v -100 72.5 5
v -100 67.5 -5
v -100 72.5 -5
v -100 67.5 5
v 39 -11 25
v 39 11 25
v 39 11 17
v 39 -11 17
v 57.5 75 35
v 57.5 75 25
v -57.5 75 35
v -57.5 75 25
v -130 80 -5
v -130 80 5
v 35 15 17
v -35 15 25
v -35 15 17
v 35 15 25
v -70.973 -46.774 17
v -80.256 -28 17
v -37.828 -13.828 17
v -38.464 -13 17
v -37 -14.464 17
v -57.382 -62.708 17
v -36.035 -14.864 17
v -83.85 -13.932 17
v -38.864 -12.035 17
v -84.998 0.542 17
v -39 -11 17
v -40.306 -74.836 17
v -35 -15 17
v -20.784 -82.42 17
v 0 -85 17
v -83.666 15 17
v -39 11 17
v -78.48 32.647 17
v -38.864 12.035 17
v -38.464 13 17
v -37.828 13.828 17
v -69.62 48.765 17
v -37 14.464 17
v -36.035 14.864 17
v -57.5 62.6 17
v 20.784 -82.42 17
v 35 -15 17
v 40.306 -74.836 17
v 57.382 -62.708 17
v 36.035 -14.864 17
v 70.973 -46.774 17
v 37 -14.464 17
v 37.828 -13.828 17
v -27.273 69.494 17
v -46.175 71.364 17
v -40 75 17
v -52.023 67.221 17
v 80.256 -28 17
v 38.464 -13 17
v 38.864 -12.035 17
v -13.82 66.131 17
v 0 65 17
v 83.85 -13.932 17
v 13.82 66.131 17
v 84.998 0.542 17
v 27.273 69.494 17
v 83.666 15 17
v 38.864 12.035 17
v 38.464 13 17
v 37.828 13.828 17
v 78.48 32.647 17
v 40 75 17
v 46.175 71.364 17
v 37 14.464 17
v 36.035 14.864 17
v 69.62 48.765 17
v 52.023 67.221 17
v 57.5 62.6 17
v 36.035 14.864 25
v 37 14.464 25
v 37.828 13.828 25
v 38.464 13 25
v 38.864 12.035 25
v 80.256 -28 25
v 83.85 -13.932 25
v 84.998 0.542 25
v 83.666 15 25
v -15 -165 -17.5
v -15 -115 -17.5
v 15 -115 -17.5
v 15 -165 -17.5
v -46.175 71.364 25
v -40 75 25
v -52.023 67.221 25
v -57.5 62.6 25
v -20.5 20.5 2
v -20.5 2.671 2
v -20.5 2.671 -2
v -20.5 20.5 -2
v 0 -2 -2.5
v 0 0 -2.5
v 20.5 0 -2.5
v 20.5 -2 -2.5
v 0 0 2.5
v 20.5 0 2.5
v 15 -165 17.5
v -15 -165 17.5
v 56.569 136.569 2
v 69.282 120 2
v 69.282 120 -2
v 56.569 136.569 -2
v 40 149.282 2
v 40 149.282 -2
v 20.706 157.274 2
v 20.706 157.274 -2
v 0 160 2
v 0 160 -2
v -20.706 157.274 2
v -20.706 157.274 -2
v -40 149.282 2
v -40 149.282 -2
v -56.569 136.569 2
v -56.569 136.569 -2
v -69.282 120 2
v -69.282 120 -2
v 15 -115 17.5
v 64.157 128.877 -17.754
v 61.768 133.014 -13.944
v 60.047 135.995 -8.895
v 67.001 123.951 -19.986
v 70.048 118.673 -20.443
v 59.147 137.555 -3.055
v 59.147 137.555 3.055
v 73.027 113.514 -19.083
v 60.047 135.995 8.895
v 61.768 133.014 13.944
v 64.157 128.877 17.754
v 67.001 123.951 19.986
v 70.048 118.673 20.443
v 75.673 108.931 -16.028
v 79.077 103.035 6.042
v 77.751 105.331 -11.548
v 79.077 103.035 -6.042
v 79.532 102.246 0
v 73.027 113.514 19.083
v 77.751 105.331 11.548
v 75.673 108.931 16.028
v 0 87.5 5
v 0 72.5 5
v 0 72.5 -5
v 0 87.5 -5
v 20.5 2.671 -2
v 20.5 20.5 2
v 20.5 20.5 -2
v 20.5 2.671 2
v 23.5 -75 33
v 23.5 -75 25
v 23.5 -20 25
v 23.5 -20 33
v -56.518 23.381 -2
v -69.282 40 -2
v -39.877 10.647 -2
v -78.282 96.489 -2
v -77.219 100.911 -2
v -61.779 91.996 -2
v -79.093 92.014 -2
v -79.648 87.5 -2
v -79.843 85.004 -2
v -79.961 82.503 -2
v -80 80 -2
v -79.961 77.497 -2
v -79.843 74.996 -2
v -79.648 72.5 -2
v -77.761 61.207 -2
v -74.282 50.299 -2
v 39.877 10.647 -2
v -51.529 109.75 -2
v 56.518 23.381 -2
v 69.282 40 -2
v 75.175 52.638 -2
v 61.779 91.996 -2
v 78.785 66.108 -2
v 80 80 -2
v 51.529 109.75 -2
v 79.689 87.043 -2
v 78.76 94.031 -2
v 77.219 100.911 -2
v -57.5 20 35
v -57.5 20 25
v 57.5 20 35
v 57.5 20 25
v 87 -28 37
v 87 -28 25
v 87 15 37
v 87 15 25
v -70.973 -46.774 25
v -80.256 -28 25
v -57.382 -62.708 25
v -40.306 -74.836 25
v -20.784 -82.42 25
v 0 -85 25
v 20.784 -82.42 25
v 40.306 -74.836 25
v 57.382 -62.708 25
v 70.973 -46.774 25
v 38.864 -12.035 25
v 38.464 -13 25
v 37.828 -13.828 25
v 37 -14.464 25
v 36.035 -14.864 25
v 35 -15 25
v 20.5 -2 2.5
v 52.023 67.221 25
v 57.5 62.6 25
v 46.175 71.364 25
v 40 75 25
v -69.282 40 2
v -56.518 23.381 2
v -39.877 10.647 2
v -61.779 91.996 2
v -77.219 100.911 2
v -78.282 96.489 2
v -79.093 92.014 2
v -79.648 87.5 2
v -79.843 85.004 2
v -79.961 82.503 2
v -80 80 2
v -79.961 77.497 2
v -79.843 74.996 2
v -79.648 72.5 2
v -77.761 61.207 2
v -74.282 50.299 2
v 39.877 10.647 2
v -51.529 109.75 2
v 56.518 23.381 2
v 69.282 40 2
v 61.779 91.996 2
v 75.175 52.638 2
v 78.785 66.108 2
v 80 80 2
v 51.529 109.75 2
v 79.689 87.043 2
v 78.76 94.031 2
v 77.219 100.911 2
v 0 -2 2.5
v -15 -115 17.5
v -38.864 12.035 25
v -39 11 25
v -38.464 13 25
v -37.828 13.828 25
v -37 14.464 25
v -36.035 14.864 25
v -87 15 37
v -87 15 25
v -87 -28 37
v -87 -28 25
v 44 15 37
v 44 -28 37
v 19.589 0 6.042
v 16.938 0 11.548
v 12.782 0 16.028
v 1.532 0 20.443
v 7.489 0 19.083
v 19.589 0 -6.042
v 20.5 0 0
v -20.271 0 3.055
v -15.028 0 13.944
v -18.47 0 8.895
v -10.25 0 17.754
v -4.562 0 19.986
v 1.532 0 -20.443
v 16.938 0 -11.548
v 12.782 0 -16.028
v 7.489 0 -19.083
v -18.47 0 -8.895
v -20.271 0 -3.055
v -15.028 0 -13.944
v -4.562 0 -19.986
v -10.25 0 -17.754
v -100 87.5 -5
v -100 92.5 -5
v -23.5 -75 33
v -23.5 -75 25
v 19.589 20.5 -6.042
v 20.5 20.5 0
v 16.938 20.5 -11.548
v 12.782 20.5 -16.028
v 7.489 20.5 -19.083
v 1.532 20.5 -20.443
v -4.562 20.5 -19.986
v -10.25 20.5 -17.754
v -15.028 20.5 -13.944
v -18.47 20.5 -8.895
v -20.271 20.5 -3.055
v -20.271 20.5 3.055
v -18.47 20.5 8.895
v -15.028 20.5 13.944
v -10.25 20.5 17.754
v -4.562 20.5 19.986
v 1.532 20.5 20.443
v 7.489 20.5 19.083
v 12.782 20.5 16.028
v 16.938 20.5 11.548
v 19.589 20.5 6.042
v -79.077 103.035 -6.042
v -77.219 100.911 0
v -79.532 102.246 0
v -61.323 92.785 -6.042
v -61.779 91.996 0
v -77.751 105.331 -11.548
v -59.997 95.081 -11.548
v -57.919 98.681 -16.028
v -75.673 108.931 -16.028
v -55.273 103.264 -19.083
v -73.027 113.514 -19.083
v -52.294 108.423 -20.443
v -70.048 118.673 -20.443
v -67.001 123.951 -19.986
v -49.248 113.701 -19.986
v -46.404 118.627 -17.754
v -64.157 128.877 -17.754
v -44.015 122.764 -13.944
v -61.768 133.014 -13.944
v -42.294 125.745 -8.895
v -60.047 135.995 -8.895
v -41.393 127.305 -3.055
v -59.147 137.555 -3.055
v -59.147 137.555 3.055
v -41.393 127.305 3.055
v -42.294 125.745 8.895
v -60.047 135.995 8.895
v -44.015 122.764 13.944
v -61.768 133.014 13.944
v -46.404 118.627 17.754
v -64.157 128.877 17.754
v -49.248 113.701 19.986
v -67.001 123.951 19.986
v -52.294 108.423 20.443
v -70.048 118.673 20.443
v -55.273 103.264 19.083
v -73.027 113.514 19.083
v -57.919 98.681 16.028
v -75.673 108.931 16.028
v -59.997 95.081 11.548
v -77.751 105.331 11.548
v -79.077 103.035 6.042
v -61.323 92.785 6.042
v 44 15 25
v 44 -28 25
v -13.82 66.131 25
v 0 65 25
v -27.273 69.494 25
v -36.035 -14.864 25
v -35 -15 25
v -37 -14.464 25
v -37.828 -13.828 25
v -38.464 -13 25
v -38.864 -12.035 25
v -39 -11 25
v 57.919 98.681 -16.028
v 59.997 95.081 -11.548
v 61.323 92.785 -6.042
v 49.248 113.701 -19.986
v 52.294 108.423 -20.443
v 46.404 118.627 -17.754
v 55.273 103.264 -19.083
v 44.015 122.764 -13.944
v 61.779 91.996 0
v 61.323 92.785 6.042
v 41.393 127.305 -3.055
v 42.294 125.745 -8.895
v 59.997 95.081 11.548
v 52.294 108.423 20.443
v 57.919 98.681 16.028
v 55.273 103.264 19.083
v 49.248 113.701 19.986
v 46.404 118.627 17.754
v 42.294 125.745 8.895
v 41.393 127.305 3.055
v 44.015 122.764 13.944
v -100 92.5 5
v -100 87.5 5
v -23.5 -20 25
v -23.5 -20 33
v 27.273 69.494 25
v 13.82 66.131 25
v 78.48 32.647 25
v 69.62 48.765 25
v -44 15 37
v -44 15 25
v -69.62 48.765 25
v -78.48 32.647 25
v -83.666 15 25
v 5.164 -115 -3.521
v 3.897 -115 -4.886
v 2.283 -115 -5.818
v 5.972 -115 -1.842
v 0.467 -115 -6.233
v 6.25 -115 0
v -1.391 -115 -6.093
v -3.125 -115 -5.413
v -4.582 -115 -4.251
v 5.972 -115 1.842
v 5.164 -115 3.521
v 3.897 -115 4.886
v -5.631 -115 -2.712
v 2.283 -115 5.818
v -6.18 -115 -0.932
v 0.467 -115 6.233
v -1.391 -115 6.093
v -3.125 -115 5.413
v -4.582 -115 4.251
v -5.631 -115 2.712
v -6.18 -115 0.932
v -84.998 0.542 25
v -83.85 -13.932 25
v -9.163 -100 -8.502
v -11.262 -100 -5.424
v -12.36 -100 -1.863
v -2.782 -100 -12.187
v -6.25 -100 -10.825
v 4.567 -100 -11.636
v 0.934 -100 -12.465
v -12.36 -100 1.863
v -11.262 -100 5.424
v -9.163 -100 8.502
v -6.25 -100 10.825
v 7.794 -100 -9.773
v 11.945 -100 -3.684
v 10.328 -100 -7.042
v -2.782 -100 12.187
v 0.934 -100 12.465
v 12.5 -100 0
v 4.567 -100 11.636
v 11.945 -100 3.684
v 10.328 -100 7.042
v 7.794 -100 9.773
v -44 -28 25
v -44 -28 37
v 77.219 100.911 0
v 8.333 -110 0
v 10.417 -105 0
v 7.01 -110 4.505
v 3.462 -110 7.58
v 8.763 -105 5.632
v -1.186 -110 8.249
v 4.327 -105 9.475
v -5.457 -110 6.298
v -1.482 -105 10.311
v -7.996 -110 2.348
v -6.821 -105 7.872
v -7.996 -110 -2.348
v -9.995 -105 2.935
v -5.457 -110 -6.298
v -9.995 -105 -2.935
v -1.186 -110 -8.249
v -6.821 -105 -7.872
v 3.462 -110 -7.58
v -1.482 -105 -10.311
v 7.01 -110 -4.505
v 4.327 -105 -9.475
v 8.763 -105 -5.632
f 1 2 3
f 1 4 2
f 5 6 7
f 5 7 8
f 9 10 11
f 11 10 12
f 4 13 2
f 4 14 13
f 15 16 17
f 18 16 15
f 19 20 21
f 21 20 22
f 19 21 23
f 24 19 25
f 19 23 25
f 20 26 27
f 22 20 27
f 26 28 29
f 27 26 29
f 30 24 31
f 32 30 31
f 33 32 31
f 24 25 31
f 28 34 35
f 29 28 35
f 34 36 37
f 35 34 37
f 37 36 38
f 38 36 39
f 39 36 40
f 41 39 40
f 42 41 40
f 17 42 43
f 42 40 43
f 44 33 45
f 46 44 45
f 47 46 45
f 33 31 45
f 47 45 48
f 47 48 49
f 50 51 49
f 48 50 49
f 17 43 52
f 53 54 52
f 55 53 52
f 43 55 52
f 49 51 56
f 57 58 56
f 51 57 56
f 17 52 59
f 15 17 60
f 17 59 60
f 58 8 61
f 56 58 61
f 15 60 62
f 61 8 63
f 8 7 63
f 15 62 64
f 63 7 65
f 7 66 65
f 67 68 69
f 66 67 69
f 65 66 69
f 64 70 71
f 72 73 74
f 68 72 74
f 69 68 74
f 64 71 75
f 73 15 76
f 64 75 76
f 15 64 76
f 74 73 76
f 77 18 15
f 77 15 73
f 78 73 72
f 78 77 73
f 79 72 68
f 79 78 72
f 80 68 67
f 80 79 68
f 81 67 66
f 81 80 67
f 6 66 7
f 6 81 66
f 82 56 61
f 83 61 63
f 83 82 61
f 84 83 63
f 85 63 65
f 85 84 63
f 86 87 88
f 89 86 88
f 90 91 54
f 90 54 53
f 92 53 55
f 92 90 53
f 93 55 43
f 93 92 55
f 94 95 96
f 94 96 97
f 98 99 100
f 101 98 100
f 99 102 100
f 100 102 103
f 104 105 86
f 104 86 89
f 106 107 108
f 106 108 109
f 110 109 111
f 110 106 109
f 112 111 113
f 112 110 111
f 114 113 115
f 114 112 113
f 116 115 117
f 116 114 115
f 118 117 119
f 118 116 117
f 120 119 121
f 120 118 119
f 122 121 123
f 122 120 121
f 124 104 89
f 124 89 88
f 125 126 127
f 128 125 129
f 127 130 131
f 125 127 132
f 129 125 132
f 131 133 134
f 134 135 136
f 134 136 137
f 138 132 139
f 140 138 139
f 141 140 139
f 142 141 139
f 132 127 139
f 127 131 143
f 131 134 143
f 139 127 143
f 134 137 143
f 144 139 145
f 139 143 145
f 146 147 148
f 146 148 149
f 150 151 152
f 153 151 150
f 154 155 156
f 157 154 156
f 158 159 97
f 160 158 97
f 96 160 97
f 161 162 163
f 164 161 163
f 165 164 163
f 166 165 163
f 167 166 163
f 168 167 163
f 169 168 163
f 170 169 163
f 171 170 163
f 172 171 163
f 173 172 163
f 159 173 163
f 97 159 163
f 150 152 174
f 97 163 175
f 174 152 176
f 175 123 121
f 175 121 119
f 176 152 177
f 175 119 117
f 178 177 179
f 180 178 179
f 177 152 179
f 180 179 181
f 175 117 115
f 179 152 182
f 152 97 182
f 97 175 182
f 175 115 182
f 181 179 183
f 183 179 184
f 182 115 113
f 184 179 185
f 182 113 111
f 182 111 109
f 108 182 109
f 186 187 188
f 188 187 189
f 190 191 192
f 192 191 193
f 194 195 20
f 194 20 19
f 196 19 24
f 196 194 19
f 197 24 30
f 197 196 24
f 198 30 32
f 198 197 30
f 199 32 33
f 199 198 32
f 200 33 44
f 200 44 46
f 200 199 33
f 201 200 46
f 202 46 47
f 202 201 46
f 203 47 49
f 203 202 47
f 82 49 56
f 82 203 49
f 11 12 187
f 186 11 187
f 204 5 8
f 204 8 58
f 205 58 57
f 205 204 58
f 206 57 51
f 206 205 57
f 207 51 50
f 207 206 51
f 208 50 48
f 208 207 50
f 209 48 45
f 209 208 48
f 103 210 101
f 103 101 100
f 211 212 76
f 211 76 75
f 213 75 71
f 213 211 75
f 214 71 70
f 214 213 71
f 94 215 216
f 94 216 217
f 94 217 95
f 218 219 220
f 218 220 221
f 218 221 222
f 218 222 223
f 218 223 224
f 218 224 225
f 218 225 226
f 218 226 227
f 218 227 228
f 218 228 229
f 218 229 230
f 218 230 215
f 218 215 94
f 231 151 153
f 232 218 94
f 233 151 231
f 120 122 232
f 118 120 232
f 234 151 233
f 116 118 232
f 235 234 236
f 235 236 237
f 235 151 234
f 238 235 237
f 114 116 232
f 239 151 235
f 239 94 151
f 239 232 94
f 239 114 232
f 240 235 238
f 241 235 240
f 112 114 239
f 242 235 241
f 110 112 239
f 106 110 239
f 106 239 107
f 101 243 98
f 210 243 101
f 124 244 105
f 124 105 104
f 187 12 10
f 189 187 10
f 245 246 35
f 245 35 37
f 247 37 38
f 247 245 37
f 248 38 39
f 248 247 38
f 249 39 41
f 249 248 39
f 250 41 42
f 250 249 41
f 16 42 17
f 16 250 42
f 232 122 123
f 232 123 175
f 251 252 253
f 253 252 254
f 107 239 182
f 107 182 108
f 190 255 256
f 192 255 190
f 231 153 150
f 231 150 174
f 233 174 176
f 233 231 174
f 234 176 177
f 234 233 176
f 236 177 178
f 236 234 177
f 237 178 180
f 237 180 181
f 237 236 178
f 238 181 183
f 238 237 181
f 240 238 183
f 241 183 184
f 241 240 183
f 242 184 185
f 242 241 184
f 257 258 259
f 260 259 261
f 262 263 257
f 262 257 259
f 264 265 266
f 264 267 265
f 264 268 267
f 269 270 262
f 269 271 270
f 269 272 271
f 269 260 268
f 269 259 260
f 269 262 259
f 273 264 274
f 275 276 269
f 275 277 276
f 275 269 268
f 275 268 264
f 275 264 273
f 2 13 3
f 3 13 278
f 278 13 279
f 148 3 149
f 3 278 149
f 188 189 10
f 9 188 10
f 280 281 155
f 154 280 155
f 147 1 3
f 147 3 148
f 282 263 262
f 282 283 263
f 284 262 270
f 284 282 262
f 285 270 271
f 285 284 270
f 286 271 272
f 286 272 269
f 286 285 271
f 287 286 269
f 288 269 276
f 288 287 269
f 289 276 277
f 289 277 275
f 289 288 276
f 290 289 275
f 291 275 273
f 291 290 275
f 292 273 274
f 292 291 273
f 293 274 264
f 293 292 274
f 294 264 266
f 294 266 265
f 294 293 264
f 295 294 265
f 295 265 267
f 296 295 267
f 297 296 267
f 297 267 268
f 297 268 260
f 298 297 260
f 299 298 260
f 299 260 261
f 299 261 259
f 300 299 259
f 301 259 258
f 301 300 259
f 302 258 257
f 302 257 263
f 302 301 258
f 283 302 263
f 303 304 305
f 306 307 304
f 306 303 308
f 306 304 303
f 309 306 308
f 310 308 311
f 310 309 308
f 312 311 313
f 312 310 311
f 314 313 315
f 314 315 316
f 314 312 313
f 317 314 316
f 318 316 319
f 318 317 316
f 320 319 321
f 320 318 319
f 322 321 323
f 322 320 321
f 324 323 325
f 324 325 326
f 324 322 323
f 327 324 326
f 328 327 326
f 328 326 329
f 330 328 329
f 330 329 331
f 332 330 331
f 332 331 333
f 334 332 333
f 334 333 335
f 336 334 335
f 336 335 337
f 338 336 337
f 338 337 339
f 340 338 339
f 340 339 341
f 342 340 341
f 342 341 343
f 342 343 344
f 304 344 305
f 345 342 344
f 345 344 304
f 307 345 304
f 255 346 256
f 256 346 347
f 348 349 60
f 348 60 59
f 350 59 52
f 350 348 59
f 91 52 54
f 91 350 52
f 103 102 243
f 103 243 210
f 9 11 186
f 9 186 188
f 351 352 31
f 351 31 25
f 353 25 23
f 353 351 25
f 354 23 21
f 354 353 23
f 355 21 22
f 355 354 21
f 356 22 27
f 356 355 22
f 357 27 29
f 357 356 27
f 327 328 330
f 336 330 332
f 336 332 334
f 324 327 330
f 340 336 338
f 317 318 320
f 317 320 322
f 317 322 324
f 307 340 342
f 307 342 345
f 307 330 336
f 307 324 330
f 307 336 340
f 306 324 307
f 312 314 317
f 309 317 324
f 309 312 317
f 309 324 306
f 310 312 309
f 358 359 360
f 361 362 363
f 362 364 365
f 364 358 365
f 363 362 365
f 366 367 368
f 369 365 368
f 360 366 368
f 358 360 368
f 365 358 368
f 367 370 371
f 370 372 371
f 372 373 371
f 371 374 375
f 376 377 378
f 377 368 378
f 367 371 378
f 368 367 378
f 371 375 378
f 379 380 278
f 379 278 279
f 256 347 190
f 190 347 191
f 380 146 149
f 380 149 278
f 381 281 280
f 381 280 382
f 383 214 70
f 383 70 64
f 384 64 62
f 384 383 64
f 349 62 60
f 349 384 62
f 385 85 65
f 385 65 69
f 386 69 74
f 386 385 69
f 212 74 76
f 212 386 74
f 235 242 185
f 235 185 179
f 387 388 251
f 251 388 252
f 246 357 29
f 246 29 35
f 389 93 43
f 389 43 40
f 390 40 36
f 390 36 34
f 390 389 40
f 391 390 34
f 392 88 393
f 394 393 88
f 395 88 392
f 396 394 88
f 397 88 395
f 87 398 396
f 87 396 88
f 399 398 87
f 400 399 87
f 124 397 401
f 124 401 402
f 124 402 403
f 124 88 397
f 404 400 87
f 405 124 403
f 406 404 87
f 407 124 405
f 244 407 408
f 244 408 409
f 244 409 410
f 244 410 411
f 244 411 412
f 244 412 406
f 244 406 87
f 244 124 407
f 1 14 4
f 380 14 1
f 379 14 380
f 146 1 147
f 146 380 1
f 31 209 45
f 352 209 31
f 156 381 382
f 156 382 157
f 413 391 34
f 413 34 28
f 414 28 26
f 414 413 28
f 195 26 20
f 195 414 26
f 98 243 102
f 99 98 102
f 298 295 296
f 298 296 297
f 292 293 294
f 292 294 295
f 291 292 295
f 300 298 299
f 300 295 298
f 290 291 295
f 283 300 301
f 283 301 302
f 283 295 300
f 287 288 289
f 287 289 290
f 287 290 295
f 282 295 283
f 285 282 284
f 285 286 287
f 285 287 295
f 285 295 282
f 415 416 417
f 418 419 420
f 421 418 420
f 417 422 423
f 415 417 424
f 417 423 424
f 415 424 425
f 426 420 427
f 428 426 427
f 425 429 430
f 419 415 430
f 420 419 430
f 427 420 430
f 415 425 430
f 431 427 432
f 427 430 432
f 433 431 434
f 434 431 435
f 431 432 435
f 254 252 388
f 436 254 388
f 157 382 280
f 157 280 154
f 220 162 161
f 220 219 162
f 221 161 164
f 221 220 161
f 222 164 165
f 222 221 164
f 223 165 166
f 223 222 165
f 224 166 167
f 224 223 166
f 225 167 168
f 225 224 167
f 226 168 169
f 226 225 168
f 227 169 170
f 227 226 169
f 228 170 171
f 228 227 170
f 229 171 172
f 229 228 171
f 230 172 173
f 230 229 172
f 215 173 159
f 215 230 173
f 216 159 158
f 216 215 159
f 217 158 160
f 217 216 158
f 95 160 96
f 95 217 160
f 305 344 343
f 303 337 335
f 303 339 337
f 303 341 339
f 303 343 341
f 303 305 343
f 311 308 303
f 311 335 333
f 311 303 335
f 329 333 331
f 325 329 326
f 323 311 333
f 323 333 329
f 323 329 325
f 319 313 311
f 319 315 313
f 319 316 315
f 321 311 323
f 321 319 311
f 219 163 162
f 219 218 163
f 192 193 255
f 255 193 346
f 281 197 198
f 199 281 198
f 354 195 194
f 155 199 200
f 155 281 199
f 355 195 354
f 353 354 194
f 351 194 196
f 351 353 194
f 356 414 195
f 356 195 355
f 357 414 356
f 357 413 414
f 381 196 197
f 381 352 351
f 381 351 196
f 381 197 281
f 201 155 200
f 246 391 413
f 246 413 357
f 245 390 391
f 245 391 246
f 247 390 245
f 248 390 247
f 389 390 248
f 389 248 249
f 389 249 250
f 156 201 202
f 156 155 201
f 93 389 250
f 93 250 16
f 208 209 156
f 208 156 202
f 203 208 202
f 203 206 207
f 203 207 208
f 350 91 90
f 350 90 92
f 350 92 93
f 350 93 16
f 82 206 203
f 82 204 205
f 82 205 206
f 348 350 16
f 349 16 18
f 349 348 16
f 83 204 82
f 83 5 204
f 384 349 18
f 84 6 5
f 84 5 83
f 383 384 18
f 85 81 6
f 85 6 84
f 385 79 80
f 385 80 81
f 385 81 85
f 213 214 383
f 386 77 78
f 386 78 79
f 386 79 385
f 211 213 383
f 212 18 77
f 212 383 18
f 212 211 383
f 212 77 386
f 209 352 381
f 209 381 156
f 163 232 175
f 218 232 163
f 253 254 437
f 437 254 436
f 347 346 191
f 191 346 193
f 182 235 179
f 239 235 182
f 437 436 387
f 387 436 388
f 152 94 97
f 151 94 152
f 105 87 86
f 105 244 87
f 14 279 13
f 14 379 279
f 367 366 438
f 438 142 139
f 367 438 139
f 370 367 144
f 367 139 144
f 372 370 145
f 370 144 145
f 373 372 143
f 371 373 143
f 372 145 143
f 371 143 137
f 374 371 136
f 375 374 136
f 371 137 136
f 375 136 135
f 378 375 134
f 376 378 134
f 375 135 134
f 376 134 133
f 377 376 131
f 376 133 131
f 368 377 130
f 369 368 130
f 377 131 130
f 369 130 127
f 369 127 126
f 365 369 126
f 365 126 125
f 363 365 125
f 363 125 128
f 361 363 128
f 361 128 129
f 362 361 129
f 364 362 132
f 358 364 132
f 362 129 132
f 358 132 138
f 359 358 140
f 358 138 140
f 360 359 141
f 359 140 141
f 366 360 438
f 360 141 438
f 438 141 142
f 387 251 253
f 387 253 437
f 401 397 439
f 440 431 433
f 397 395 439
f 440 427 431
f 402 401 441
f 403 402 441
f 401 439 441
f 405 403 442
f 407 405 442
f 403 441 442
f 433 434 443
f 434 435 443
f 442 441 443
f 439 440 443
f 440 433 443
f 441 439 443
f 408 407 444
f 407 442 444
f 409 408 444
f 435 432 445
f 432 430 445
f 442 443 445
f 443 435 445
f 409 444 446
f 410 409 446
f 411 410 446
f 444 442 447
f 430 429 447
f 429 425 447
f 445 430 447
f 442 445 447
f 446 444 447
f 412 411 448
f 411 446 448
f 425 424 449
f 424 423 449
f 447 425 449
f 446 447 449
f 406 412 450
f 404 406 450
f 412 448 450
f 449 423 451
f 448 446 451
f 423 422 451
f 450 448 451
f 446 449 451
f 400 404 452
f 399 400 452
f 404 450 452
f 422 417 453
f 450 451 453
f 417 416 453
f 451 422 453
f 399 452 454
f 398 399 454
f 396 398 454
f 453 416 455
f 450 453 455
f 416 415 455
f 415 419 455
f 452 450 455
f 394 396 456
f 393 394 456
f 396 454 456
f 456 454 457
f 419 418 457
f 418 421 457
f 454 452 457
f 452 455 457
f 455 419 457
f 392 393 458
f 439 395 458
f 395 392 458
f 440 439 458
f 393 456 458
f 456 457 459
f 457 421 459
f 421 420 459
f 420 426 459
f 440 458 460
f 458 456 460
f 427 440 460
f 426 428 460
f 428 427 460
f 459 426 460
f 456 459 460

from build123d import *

# Parameters (mm, degrees)
F1_DEPTH  = 2
F4_DEPTH  = 17.5
F0_W      = 20.5
F0_H      = 2
F5_DEPTH  = 2.5
F8_DEPTH  = 5
F10_W     = 47
F10_H     = 55
F11_DEPTH = 8
F12_DEPTH = 10
F13_DEPTH = 12
F14_DEPTH = 8


with BuildPart() as f1:
    # F0 (on Top) → F1 (new body, symmetric)
    with BuildSketch(Plane.XY):
        with BuildLine():
            Line((0, 72.5), (0, 20.5))
            Line((0, 20.5), (20.5, 20.5))
            Line((20.5, 20.5), (20.5, 2.6711567395))
            ThreePointArc((20.5, 2.6711567395), (48.6164989062, 16.4670476516), (69.2820323028, 40))
            Line((69.2820323028, 40), (0, 80))
            Line((0, 80), (0, 72.5))
        make_face()
        with BuildLine():
            Line((-20.5, 20.5), (0, 20.5))
            Line((0, 20.5), (0, 72.5))
            Line((0, 72.5), (-12.9903810568, 72.5))
            Line((-12.9903810568, 72.5), (-69.2820323028, 40))
            ThreePointArc((-69.2820323028, 40), (-48.6164989062, 16.4670476516), (-20.5, 2.6711567395))
            Line((-20.5, 2.6711567395), (-20.5, 20.5))
        make_face()
        with BuildLine():
            ThreePointArc((-79.6476616104, 72.5), (-76.2172941809, 55.6910702059), (-69.2820323028, 40))
            Line((-69.2820323028, 40), (-12.9903810568, 72.5))
            Line((-12.9903810568, 72.5), (-79.6476616104, 72.5))
        make_face()
        with BuildLine():
            Line((-12.9903810568, 72.5), (0, 80))
            Line((0, 80), (-80, 80))
            ThreePointArc((-80, 80), (-79.911866856, 76.2458642026), (-79.6476616104, 72.5))
            Line((-79.6476616104, 72.5), (-12.9903810568, 72.5))
        make_face()
        with BuildLine():
            Line((0, 80), (69.2820323028, 40))
            ThreePointArc((69.2820323028, 40), (77.2740661031, 59.2944763918), (80, 80))
            ThreePointArc((80, 80), (79.3016374885, 90.5475253803), (77.2187427088, 100.9109008526))
            Line((77.2187427088, 100.9109008526), (61.7785115252, 91.9964792224))
            Line((61.7785115252, 91.9964792224), (51.5285115252, 109.75))
            Line((51.5285115252, 109.75), (69.2820323028, 120))
            ThreePointArc((69.2820323028, 120), (0, 160), (-69.2820323028, 120))
            Line((-69.2820323028, 120), (-51.5285115252, 109.75))
            Line((-51.5285115252, 109.75), (-61.7785115252, 91.9964792224))
            Line((-61.7785115252, 91.9964792224), (-77.2187427088, 100.9109008526))
            ThreePointArc((-77.2187427088, 100.9109008526), (-78.719313173, 94.2572694992), (-79.6476616104, 87.5))
            Line((-79.6476616104, 87.5), (0, 87.5))
            Line((0, 87.5), (0, 80))
        make_face()
        with BuildLine():
            Line((-80, 80), (0, 80))
            Line((0, 80), (0, 87.5))
            Line((0, 87.5), (-79.6476616104, 87.5))
            ThreePointArc((-79.6476616104, 87.5), (-79.911866856, 83.7541357974), (-80, 80))
        make_face()
        Polygon((-12.9903810568, 72.5), (0, 72.5), (0, 80), align=None)
    extrude(amount=F1_DEPTH, both=True)


with BuildPart() as f2:
    # F0 (on Top) → F2 (revolve)
    with BuildSketch(Plane.XY):
        with BuildLine():
            Line((0, 20.5), (0, 0))
            ThreePointArc((0, 0), (10.3366469216, 0.6705998358), (20.5, 2.6711567395))
            Line((20.5, 2.6711567395), (20.5, 20.5))
            Line((20.5, 20.5), (0, 20.5))
        make_face()
        with BuildLine():
            ThreePointArc((20.5, 2.6711567395), (10.3366469216, 0.6705998358), (0, 0))
            Line((0, 0), (20.5, 0))
            Line((20.5, 0), (20.5, 2.6711567395))
        make_face()
    revolve(axis=Axis((0, 10.25, 0), (0, 1, 0)))


with BuildPart() as f3:
    # F0 (on Top) → F3 (revolve)
    with BuildSketch(Plane.XY):
        Polygon((12.5, -100), (0, -100), (0, -115), (6.25, -115), align=None)
    revolve(axis=Axis((0, -115, 0), (0, -1, 0)))

    # F0 (on Top) → F4 (join, symmetric)
    with BuildSketch(Plane.XY):
        Polygon((0, -130), (0, -115), (-15, -115), (-15, -165), (15, -165), (15, -115), (6.25, -115), align=None)
        Polygon((6.25, -115), (0, -115), (0, -130), align=None)
    extrude(amount=F4_DEPTH, both=True)


with BuildPart() as f5:
    # F0 (on Top) → F5 (new body, symmetric)
    with BuildSketch(Plane.XY):
        with Locations((10.25, -1)):
            Rectangle(F0_W, F0_H)
    extrude(amount=F5_DEPTH, both=True)


with BuildPart() as f6:
    # F0 (on Top) → F6 (revolve)
    with BuildSketch(Plane.XY):
        with BuildLine():
            Line((61.7785115252, 91.9964792224), (77.2187427088, 100.9109008526))
            ThreePointArc((77.2187427088, 100.9109008526), (73.86959927, 110.7129012581), (69.2820323028, 120))
            Line((69.2820323028, 120), (51.5285115252, 109.75))
            Line((51.5285115252, 109.75), (61.7785115252, 91.9964792224))
        make_face()
        with BuildLine():
            ThreePointArc((69.2820323028, 120), (73.86959927, 110.7129012581), (77.2187427088, 100.9109008526))
            Line((77.2187427088, 100.9109008526), (79.5320323028, 102.2464792224))
            Line((79.5320323028, 102.2464792224), (69.2820323028, 120))
        make_face()
    revolve(axis=Axis((60.405271914, 114.875, 0), (-0.8660254038, -0.5, 0)))


with BuildPart() as f7:
    # F0 (on Top) → F7 (revolve)
    with BuildSketch(Plane.XY):
        with BuildLine():
            ThreePointArc((-69.2820323028, 120), (-73.86959927, 110.7129012581), (-77.2187427088, 100.9109008526))
            Line((-77.2187427088, 100.9109008526), (-61.7785115252, 91.9964792224))
            Line((-61.7785115252, 91.9964792224), (-51.5285115252, 109.75))
            Line((-51.5285115252, 109.75), (-69.2820323028, 120))
        make_face()
        with BuildLine():
            Line((-79.5320323028, 102.2464792224), (-77.2187427088, 100.9109008526))
            ThreePointArc((-77.2187427088, 100.9109008526), (-73.86959927, 110.7129012581), (-69.2820323028, 120))
            Line((-69.2820323028, 120), (-79.5320323028, 102.2464792224))
        make_face()
    revolve(axis=Axis((-60.405271914, 114.875, 0), (0.8660254038, -0.5, 0)))


with BuildPart() as f8:
    # F0 (on Top) → F8 (new body, symmetric)
    with BuildSketch(Plane.XY):
        Polygon((-100, 67.5), (-100, 72.5), (-100, 80), (-130, 80), align=None)
        Polygon((-130, 80), (-100, 80), (-100, 87.5), (-100, 92.5), align=None)
        with BuildLine():
            Line((-100, 80), (-80, 80))
            ThreePointArc((-80, 80), (-79.911866856, 83.7541357974), (-79.6476616104, 87.5))
            Line((-79.6476616104, 87.5), (-100, 87.5))
            Line((-100, 87.5), (-100, 80))
        make_face()
        with BuildLine():
            Line((-100, 72.5), (-79.6476616104, 72.5))
            ThreePointArc((-79.6476616104, 72.5), (-79.911866856, 76.2458642026), (-80, 80))
            Line((-80, 80), (-100, 80))
            Line((-100, 80), (-100, 72.5))
        make_face()
        with BuildLine():
            Line((-80, 80), (0, 80))
            Line((0, 80), (0, 87.5))
            Line((0, 87.5), (-79.6476616104, 87.5))
            ThreePointArc((-79.6476616104, 87.5), (-79.911866856, 83.7541357974), (-80, 80))
        make_face()
        with BuildLine():
            Line((-12.9903810568, 72.5), (0, 80))
            Line((0, 80), (-80, 80))
            ThreePointArc((-80, 80), (-79.911866856, 76.2458642026), (-79.6476616104, 72.5))
            Line((-79.6476616104, 72.5), (-12.9903810568, 72.5))
        make_face()
        Polygon((-12.9903810568, 72.5), (0, 72.5), (0, 80), align=None)
    extrude(amount=F8_DEPTH, both=True)


with BuildPart() as f11:
    # F10 (on offset) → F11 (new body)
    with BuildSketch(Plane.XY.offset(25)):
        with BuildLine():
            Line((-57.5, 20), (-57.5, 62.5999201277))
            ThreePointArc((-57.5, 62.5999201277), (-74.4875706096, 40.946328586), (-83.6660026534, 15))
            Line((-83.6660026534, 15), (-44, 15))
            Line((-44, 15), (-44, -28))
            Line((-44, -28), (-80.2558409089, -28))
            ThreePointArc((-80.2558409089, -28), (0, -85), (80.2558409089, -28))
            Line((80.2558409089, -28), (44, -28))
            Line((44, -28), (44, 15))
            Line((44, 15), (83.6660026534, 15))
            ThreePointArc((83.6660026534, 15), (74.4875706096, 40.946328586), (57.5, 62.5999201277))
            Line((57.5, 62.5999201277), (57.5, 20))
            Line((57.5, 20), (-57.5, 20))
        make_face()
        with Locations((0, -47.5)):
            Rectangle(F10_W, F10_H, mode=Mode.SUBTRACT)
        with BuildLine():
            ThreePointArc((-39, 11), (-37.8284271247, 13.8284271247), (-35, 15))
            Line((-35, 15), (0, 15))
            Line((0, 15), (35, 15))
            ThreePointArc((35, 15), (37.8284271247, 13.8284271247), (39, 11))
            Line((39, 11), (39, 0))
            Line((39, 0), (39, -11))
            ThreePointArc((39, -11), (37.8284271247, -13.8284271247), (35, -15))
            Line((35, -15), (0, -15))
            Line((0, -15), (-35, -15))
            ThreePointArc((-35, -15), (-37.8284271247, -13.8284271247), (-39, -11))
            Line((-39, -11), (-39, 0))
            Line((-39, 0), (-39, 11))
        make_face(mode=Mode.SUBTRACT)
        with BuildLine():
            Line((-44, 15), (-83.6660026534, 15))
            ThreePointArc((-83.6660026534, 15), (-84.7339524584, -6.7199182124), (-80.2558409089, -28))
            Line((-80.2558409089, -28), (-44, -28))
            Line((-44, -28), (-44, 15))
        make_face()
        with Locations((0, -47.5)):
            Rectangle(F10_W, F10_H)
        with BuildLine():
            Line((44, -28), (80.2558409089, -28))
            ThreePointArc((80.2558409089, -28), (84.7339524584, -6.7199182124), (83.6660026534, 15))
            Line((83.6660026534, 15), (44, 15))
            Line((44, 15), (44, -28))
        make_face()
        with BuildLine():
            ThreePointArc((0, 65), (-20.6155281281, 67.5378874876), (-40, 75))
            ThreePointArc((-40, 75), (-49.1426799759, 69.354141944), (-57.5, 62.5999201277))
            Line((-57.5, 62.5999201277), (-57.5, 20))
            Line((-57.5, 20), (57.5, 20))
            Line((57.5, 20), (57.5, 62.5999201277))
            ThreePointArc((57.5, 62.5999201277), (49.1426799759, 69.354141944), (40, 75))
            ThreePointArc((40, 75), (20.6155281281, 67.5378874876), (0, 65))
        make_face()
    extrude(amount=-F11_DEPTH)

    # F10 (on offset) → F14 (join)
    with BuildSketch(Plane.XY.offset(25)):
        with Locations((0, -47.5)):
            Rectangle(F10_W, F10_H)
    extrude(amount=F14_DEPTH)


with BuildPart() as f12:
    # F10 (on offset) → F12 (new body)
    with BuildSketch(Plane.XY.offset(25)):
        with BuildLine():
            Line((0, 75), (0, 65))
            ThreePointArc((0, 65), (20.6155281281, 67.5378874876), (40, 75))
            Line((40, 75), (0, 75))
        make_face()
        with BuildLine():
            Line((0, 75), (-40, 75))
            ThreePointArc((-40, 75), (-20.6155281281, 67.5378874876), (0, 65))
            Line((0, 65), (0, 75))
        make_face()
        with BuildLine():
            ThreePointArc((-57.5, 62.5999201277), (-49.1426799759, 69.354141944), (-40, 75))
            Line((-40, 75), (-57.5, 75))
            Line((-57.5, 75), (-57.5, 62.5999201277))
        make_face()
        with BuildLine():
            Line((57.5, 75), (40, 75))
            ThreePointArc((40, 75), (49.1426799759, 69.354141944), (57.5, 62.5999201277))
            Line((57.5, 62.5999201277), (57.5, 75))
        make_face()
        with BuildLine():
            ThreePointArc((0, 65), (-20.6155281281, 67.5378874876), (-40, 75))
            ThreePointArc((-40, 75), (-49.1426799759, 69.354141944), (-57.5, 62.5999201277))
            Line((-57.5, 62.5999201277), (-57.5, 20))
            Line((-57.5, 20), (57.5, 20))
            Line((57.5, 20), (57.5, 62.5999201277))
            ThreePointArc((57.5, 62.5999201277), (49.1426799759, 69.354141944), (40, 75))
            ThreePointArc((40, 75), (20.6155281281, 67.5378874876), (0, 65))
        make_face()
    extrude(amount=F12_DEPTH)


with BuildPart() as f13:
    # F10 (on offset) → F13 (new body)
    with BuildSketch(Plane.XY.offset(25)):
        with BuildLine():
            ThreePointArc((-80.2558409089, -28), (-84.7339524584, -6.7199182124), (-83.6660026534, 15))
            Line((-83.6660026534, 15), (-87, 15))
            Line((-87, 15), (-87, -28))
            Line((-87, -28), (-80.2558409089, -28))
        make_face()
        with BuildLine():
            Line((-44, 15), (-83.6660026534, 15))
            ThreePointArc((-83.6660026534, 15), (-84.7339524584, -6.7199182124), (-80.2558409089, -28))
            Line((-80.2558409089, -28), (-44, -28))
            Line((-44, -28), (-44, 15))
        make_face()
    extrude(amount=F13_DEPTH)


with BuildPart() as f13b:
    # F10 (on offset) → F13, piece 2 (new body)
    with BuildSketch(Plane.XY.offset(25)):
        with BuildLine():
            Line((44, -28), (80.2558409089, -28))
            ThreePointArc((80.2558409089, -28), (84.7339524584, -6.7199182124), (83.6660026534, 15))
            Line((83.6660026534, 15), (44, 15))
            Line((44, 15), (44, -28))
        make_face()
        with BuildLine():
            ThreePointArc((83.6660026534, 15), (84.7339524584, -6.7199182124), (80.2558409089, -28))
            Line((80.2558409089, -28), (87, -28))
            Line((87, -28), (87, 15))
            Line((87, 15), (83.6660026534, 15))
        make_face()
    extrude(amount=F13_DEPTH)


solid = Compound([f1.part, f2.part, f3.part, f5.part, f6.part, f7.part, f8.part, f11.part, f12.part, f13.part, f13b.part])
